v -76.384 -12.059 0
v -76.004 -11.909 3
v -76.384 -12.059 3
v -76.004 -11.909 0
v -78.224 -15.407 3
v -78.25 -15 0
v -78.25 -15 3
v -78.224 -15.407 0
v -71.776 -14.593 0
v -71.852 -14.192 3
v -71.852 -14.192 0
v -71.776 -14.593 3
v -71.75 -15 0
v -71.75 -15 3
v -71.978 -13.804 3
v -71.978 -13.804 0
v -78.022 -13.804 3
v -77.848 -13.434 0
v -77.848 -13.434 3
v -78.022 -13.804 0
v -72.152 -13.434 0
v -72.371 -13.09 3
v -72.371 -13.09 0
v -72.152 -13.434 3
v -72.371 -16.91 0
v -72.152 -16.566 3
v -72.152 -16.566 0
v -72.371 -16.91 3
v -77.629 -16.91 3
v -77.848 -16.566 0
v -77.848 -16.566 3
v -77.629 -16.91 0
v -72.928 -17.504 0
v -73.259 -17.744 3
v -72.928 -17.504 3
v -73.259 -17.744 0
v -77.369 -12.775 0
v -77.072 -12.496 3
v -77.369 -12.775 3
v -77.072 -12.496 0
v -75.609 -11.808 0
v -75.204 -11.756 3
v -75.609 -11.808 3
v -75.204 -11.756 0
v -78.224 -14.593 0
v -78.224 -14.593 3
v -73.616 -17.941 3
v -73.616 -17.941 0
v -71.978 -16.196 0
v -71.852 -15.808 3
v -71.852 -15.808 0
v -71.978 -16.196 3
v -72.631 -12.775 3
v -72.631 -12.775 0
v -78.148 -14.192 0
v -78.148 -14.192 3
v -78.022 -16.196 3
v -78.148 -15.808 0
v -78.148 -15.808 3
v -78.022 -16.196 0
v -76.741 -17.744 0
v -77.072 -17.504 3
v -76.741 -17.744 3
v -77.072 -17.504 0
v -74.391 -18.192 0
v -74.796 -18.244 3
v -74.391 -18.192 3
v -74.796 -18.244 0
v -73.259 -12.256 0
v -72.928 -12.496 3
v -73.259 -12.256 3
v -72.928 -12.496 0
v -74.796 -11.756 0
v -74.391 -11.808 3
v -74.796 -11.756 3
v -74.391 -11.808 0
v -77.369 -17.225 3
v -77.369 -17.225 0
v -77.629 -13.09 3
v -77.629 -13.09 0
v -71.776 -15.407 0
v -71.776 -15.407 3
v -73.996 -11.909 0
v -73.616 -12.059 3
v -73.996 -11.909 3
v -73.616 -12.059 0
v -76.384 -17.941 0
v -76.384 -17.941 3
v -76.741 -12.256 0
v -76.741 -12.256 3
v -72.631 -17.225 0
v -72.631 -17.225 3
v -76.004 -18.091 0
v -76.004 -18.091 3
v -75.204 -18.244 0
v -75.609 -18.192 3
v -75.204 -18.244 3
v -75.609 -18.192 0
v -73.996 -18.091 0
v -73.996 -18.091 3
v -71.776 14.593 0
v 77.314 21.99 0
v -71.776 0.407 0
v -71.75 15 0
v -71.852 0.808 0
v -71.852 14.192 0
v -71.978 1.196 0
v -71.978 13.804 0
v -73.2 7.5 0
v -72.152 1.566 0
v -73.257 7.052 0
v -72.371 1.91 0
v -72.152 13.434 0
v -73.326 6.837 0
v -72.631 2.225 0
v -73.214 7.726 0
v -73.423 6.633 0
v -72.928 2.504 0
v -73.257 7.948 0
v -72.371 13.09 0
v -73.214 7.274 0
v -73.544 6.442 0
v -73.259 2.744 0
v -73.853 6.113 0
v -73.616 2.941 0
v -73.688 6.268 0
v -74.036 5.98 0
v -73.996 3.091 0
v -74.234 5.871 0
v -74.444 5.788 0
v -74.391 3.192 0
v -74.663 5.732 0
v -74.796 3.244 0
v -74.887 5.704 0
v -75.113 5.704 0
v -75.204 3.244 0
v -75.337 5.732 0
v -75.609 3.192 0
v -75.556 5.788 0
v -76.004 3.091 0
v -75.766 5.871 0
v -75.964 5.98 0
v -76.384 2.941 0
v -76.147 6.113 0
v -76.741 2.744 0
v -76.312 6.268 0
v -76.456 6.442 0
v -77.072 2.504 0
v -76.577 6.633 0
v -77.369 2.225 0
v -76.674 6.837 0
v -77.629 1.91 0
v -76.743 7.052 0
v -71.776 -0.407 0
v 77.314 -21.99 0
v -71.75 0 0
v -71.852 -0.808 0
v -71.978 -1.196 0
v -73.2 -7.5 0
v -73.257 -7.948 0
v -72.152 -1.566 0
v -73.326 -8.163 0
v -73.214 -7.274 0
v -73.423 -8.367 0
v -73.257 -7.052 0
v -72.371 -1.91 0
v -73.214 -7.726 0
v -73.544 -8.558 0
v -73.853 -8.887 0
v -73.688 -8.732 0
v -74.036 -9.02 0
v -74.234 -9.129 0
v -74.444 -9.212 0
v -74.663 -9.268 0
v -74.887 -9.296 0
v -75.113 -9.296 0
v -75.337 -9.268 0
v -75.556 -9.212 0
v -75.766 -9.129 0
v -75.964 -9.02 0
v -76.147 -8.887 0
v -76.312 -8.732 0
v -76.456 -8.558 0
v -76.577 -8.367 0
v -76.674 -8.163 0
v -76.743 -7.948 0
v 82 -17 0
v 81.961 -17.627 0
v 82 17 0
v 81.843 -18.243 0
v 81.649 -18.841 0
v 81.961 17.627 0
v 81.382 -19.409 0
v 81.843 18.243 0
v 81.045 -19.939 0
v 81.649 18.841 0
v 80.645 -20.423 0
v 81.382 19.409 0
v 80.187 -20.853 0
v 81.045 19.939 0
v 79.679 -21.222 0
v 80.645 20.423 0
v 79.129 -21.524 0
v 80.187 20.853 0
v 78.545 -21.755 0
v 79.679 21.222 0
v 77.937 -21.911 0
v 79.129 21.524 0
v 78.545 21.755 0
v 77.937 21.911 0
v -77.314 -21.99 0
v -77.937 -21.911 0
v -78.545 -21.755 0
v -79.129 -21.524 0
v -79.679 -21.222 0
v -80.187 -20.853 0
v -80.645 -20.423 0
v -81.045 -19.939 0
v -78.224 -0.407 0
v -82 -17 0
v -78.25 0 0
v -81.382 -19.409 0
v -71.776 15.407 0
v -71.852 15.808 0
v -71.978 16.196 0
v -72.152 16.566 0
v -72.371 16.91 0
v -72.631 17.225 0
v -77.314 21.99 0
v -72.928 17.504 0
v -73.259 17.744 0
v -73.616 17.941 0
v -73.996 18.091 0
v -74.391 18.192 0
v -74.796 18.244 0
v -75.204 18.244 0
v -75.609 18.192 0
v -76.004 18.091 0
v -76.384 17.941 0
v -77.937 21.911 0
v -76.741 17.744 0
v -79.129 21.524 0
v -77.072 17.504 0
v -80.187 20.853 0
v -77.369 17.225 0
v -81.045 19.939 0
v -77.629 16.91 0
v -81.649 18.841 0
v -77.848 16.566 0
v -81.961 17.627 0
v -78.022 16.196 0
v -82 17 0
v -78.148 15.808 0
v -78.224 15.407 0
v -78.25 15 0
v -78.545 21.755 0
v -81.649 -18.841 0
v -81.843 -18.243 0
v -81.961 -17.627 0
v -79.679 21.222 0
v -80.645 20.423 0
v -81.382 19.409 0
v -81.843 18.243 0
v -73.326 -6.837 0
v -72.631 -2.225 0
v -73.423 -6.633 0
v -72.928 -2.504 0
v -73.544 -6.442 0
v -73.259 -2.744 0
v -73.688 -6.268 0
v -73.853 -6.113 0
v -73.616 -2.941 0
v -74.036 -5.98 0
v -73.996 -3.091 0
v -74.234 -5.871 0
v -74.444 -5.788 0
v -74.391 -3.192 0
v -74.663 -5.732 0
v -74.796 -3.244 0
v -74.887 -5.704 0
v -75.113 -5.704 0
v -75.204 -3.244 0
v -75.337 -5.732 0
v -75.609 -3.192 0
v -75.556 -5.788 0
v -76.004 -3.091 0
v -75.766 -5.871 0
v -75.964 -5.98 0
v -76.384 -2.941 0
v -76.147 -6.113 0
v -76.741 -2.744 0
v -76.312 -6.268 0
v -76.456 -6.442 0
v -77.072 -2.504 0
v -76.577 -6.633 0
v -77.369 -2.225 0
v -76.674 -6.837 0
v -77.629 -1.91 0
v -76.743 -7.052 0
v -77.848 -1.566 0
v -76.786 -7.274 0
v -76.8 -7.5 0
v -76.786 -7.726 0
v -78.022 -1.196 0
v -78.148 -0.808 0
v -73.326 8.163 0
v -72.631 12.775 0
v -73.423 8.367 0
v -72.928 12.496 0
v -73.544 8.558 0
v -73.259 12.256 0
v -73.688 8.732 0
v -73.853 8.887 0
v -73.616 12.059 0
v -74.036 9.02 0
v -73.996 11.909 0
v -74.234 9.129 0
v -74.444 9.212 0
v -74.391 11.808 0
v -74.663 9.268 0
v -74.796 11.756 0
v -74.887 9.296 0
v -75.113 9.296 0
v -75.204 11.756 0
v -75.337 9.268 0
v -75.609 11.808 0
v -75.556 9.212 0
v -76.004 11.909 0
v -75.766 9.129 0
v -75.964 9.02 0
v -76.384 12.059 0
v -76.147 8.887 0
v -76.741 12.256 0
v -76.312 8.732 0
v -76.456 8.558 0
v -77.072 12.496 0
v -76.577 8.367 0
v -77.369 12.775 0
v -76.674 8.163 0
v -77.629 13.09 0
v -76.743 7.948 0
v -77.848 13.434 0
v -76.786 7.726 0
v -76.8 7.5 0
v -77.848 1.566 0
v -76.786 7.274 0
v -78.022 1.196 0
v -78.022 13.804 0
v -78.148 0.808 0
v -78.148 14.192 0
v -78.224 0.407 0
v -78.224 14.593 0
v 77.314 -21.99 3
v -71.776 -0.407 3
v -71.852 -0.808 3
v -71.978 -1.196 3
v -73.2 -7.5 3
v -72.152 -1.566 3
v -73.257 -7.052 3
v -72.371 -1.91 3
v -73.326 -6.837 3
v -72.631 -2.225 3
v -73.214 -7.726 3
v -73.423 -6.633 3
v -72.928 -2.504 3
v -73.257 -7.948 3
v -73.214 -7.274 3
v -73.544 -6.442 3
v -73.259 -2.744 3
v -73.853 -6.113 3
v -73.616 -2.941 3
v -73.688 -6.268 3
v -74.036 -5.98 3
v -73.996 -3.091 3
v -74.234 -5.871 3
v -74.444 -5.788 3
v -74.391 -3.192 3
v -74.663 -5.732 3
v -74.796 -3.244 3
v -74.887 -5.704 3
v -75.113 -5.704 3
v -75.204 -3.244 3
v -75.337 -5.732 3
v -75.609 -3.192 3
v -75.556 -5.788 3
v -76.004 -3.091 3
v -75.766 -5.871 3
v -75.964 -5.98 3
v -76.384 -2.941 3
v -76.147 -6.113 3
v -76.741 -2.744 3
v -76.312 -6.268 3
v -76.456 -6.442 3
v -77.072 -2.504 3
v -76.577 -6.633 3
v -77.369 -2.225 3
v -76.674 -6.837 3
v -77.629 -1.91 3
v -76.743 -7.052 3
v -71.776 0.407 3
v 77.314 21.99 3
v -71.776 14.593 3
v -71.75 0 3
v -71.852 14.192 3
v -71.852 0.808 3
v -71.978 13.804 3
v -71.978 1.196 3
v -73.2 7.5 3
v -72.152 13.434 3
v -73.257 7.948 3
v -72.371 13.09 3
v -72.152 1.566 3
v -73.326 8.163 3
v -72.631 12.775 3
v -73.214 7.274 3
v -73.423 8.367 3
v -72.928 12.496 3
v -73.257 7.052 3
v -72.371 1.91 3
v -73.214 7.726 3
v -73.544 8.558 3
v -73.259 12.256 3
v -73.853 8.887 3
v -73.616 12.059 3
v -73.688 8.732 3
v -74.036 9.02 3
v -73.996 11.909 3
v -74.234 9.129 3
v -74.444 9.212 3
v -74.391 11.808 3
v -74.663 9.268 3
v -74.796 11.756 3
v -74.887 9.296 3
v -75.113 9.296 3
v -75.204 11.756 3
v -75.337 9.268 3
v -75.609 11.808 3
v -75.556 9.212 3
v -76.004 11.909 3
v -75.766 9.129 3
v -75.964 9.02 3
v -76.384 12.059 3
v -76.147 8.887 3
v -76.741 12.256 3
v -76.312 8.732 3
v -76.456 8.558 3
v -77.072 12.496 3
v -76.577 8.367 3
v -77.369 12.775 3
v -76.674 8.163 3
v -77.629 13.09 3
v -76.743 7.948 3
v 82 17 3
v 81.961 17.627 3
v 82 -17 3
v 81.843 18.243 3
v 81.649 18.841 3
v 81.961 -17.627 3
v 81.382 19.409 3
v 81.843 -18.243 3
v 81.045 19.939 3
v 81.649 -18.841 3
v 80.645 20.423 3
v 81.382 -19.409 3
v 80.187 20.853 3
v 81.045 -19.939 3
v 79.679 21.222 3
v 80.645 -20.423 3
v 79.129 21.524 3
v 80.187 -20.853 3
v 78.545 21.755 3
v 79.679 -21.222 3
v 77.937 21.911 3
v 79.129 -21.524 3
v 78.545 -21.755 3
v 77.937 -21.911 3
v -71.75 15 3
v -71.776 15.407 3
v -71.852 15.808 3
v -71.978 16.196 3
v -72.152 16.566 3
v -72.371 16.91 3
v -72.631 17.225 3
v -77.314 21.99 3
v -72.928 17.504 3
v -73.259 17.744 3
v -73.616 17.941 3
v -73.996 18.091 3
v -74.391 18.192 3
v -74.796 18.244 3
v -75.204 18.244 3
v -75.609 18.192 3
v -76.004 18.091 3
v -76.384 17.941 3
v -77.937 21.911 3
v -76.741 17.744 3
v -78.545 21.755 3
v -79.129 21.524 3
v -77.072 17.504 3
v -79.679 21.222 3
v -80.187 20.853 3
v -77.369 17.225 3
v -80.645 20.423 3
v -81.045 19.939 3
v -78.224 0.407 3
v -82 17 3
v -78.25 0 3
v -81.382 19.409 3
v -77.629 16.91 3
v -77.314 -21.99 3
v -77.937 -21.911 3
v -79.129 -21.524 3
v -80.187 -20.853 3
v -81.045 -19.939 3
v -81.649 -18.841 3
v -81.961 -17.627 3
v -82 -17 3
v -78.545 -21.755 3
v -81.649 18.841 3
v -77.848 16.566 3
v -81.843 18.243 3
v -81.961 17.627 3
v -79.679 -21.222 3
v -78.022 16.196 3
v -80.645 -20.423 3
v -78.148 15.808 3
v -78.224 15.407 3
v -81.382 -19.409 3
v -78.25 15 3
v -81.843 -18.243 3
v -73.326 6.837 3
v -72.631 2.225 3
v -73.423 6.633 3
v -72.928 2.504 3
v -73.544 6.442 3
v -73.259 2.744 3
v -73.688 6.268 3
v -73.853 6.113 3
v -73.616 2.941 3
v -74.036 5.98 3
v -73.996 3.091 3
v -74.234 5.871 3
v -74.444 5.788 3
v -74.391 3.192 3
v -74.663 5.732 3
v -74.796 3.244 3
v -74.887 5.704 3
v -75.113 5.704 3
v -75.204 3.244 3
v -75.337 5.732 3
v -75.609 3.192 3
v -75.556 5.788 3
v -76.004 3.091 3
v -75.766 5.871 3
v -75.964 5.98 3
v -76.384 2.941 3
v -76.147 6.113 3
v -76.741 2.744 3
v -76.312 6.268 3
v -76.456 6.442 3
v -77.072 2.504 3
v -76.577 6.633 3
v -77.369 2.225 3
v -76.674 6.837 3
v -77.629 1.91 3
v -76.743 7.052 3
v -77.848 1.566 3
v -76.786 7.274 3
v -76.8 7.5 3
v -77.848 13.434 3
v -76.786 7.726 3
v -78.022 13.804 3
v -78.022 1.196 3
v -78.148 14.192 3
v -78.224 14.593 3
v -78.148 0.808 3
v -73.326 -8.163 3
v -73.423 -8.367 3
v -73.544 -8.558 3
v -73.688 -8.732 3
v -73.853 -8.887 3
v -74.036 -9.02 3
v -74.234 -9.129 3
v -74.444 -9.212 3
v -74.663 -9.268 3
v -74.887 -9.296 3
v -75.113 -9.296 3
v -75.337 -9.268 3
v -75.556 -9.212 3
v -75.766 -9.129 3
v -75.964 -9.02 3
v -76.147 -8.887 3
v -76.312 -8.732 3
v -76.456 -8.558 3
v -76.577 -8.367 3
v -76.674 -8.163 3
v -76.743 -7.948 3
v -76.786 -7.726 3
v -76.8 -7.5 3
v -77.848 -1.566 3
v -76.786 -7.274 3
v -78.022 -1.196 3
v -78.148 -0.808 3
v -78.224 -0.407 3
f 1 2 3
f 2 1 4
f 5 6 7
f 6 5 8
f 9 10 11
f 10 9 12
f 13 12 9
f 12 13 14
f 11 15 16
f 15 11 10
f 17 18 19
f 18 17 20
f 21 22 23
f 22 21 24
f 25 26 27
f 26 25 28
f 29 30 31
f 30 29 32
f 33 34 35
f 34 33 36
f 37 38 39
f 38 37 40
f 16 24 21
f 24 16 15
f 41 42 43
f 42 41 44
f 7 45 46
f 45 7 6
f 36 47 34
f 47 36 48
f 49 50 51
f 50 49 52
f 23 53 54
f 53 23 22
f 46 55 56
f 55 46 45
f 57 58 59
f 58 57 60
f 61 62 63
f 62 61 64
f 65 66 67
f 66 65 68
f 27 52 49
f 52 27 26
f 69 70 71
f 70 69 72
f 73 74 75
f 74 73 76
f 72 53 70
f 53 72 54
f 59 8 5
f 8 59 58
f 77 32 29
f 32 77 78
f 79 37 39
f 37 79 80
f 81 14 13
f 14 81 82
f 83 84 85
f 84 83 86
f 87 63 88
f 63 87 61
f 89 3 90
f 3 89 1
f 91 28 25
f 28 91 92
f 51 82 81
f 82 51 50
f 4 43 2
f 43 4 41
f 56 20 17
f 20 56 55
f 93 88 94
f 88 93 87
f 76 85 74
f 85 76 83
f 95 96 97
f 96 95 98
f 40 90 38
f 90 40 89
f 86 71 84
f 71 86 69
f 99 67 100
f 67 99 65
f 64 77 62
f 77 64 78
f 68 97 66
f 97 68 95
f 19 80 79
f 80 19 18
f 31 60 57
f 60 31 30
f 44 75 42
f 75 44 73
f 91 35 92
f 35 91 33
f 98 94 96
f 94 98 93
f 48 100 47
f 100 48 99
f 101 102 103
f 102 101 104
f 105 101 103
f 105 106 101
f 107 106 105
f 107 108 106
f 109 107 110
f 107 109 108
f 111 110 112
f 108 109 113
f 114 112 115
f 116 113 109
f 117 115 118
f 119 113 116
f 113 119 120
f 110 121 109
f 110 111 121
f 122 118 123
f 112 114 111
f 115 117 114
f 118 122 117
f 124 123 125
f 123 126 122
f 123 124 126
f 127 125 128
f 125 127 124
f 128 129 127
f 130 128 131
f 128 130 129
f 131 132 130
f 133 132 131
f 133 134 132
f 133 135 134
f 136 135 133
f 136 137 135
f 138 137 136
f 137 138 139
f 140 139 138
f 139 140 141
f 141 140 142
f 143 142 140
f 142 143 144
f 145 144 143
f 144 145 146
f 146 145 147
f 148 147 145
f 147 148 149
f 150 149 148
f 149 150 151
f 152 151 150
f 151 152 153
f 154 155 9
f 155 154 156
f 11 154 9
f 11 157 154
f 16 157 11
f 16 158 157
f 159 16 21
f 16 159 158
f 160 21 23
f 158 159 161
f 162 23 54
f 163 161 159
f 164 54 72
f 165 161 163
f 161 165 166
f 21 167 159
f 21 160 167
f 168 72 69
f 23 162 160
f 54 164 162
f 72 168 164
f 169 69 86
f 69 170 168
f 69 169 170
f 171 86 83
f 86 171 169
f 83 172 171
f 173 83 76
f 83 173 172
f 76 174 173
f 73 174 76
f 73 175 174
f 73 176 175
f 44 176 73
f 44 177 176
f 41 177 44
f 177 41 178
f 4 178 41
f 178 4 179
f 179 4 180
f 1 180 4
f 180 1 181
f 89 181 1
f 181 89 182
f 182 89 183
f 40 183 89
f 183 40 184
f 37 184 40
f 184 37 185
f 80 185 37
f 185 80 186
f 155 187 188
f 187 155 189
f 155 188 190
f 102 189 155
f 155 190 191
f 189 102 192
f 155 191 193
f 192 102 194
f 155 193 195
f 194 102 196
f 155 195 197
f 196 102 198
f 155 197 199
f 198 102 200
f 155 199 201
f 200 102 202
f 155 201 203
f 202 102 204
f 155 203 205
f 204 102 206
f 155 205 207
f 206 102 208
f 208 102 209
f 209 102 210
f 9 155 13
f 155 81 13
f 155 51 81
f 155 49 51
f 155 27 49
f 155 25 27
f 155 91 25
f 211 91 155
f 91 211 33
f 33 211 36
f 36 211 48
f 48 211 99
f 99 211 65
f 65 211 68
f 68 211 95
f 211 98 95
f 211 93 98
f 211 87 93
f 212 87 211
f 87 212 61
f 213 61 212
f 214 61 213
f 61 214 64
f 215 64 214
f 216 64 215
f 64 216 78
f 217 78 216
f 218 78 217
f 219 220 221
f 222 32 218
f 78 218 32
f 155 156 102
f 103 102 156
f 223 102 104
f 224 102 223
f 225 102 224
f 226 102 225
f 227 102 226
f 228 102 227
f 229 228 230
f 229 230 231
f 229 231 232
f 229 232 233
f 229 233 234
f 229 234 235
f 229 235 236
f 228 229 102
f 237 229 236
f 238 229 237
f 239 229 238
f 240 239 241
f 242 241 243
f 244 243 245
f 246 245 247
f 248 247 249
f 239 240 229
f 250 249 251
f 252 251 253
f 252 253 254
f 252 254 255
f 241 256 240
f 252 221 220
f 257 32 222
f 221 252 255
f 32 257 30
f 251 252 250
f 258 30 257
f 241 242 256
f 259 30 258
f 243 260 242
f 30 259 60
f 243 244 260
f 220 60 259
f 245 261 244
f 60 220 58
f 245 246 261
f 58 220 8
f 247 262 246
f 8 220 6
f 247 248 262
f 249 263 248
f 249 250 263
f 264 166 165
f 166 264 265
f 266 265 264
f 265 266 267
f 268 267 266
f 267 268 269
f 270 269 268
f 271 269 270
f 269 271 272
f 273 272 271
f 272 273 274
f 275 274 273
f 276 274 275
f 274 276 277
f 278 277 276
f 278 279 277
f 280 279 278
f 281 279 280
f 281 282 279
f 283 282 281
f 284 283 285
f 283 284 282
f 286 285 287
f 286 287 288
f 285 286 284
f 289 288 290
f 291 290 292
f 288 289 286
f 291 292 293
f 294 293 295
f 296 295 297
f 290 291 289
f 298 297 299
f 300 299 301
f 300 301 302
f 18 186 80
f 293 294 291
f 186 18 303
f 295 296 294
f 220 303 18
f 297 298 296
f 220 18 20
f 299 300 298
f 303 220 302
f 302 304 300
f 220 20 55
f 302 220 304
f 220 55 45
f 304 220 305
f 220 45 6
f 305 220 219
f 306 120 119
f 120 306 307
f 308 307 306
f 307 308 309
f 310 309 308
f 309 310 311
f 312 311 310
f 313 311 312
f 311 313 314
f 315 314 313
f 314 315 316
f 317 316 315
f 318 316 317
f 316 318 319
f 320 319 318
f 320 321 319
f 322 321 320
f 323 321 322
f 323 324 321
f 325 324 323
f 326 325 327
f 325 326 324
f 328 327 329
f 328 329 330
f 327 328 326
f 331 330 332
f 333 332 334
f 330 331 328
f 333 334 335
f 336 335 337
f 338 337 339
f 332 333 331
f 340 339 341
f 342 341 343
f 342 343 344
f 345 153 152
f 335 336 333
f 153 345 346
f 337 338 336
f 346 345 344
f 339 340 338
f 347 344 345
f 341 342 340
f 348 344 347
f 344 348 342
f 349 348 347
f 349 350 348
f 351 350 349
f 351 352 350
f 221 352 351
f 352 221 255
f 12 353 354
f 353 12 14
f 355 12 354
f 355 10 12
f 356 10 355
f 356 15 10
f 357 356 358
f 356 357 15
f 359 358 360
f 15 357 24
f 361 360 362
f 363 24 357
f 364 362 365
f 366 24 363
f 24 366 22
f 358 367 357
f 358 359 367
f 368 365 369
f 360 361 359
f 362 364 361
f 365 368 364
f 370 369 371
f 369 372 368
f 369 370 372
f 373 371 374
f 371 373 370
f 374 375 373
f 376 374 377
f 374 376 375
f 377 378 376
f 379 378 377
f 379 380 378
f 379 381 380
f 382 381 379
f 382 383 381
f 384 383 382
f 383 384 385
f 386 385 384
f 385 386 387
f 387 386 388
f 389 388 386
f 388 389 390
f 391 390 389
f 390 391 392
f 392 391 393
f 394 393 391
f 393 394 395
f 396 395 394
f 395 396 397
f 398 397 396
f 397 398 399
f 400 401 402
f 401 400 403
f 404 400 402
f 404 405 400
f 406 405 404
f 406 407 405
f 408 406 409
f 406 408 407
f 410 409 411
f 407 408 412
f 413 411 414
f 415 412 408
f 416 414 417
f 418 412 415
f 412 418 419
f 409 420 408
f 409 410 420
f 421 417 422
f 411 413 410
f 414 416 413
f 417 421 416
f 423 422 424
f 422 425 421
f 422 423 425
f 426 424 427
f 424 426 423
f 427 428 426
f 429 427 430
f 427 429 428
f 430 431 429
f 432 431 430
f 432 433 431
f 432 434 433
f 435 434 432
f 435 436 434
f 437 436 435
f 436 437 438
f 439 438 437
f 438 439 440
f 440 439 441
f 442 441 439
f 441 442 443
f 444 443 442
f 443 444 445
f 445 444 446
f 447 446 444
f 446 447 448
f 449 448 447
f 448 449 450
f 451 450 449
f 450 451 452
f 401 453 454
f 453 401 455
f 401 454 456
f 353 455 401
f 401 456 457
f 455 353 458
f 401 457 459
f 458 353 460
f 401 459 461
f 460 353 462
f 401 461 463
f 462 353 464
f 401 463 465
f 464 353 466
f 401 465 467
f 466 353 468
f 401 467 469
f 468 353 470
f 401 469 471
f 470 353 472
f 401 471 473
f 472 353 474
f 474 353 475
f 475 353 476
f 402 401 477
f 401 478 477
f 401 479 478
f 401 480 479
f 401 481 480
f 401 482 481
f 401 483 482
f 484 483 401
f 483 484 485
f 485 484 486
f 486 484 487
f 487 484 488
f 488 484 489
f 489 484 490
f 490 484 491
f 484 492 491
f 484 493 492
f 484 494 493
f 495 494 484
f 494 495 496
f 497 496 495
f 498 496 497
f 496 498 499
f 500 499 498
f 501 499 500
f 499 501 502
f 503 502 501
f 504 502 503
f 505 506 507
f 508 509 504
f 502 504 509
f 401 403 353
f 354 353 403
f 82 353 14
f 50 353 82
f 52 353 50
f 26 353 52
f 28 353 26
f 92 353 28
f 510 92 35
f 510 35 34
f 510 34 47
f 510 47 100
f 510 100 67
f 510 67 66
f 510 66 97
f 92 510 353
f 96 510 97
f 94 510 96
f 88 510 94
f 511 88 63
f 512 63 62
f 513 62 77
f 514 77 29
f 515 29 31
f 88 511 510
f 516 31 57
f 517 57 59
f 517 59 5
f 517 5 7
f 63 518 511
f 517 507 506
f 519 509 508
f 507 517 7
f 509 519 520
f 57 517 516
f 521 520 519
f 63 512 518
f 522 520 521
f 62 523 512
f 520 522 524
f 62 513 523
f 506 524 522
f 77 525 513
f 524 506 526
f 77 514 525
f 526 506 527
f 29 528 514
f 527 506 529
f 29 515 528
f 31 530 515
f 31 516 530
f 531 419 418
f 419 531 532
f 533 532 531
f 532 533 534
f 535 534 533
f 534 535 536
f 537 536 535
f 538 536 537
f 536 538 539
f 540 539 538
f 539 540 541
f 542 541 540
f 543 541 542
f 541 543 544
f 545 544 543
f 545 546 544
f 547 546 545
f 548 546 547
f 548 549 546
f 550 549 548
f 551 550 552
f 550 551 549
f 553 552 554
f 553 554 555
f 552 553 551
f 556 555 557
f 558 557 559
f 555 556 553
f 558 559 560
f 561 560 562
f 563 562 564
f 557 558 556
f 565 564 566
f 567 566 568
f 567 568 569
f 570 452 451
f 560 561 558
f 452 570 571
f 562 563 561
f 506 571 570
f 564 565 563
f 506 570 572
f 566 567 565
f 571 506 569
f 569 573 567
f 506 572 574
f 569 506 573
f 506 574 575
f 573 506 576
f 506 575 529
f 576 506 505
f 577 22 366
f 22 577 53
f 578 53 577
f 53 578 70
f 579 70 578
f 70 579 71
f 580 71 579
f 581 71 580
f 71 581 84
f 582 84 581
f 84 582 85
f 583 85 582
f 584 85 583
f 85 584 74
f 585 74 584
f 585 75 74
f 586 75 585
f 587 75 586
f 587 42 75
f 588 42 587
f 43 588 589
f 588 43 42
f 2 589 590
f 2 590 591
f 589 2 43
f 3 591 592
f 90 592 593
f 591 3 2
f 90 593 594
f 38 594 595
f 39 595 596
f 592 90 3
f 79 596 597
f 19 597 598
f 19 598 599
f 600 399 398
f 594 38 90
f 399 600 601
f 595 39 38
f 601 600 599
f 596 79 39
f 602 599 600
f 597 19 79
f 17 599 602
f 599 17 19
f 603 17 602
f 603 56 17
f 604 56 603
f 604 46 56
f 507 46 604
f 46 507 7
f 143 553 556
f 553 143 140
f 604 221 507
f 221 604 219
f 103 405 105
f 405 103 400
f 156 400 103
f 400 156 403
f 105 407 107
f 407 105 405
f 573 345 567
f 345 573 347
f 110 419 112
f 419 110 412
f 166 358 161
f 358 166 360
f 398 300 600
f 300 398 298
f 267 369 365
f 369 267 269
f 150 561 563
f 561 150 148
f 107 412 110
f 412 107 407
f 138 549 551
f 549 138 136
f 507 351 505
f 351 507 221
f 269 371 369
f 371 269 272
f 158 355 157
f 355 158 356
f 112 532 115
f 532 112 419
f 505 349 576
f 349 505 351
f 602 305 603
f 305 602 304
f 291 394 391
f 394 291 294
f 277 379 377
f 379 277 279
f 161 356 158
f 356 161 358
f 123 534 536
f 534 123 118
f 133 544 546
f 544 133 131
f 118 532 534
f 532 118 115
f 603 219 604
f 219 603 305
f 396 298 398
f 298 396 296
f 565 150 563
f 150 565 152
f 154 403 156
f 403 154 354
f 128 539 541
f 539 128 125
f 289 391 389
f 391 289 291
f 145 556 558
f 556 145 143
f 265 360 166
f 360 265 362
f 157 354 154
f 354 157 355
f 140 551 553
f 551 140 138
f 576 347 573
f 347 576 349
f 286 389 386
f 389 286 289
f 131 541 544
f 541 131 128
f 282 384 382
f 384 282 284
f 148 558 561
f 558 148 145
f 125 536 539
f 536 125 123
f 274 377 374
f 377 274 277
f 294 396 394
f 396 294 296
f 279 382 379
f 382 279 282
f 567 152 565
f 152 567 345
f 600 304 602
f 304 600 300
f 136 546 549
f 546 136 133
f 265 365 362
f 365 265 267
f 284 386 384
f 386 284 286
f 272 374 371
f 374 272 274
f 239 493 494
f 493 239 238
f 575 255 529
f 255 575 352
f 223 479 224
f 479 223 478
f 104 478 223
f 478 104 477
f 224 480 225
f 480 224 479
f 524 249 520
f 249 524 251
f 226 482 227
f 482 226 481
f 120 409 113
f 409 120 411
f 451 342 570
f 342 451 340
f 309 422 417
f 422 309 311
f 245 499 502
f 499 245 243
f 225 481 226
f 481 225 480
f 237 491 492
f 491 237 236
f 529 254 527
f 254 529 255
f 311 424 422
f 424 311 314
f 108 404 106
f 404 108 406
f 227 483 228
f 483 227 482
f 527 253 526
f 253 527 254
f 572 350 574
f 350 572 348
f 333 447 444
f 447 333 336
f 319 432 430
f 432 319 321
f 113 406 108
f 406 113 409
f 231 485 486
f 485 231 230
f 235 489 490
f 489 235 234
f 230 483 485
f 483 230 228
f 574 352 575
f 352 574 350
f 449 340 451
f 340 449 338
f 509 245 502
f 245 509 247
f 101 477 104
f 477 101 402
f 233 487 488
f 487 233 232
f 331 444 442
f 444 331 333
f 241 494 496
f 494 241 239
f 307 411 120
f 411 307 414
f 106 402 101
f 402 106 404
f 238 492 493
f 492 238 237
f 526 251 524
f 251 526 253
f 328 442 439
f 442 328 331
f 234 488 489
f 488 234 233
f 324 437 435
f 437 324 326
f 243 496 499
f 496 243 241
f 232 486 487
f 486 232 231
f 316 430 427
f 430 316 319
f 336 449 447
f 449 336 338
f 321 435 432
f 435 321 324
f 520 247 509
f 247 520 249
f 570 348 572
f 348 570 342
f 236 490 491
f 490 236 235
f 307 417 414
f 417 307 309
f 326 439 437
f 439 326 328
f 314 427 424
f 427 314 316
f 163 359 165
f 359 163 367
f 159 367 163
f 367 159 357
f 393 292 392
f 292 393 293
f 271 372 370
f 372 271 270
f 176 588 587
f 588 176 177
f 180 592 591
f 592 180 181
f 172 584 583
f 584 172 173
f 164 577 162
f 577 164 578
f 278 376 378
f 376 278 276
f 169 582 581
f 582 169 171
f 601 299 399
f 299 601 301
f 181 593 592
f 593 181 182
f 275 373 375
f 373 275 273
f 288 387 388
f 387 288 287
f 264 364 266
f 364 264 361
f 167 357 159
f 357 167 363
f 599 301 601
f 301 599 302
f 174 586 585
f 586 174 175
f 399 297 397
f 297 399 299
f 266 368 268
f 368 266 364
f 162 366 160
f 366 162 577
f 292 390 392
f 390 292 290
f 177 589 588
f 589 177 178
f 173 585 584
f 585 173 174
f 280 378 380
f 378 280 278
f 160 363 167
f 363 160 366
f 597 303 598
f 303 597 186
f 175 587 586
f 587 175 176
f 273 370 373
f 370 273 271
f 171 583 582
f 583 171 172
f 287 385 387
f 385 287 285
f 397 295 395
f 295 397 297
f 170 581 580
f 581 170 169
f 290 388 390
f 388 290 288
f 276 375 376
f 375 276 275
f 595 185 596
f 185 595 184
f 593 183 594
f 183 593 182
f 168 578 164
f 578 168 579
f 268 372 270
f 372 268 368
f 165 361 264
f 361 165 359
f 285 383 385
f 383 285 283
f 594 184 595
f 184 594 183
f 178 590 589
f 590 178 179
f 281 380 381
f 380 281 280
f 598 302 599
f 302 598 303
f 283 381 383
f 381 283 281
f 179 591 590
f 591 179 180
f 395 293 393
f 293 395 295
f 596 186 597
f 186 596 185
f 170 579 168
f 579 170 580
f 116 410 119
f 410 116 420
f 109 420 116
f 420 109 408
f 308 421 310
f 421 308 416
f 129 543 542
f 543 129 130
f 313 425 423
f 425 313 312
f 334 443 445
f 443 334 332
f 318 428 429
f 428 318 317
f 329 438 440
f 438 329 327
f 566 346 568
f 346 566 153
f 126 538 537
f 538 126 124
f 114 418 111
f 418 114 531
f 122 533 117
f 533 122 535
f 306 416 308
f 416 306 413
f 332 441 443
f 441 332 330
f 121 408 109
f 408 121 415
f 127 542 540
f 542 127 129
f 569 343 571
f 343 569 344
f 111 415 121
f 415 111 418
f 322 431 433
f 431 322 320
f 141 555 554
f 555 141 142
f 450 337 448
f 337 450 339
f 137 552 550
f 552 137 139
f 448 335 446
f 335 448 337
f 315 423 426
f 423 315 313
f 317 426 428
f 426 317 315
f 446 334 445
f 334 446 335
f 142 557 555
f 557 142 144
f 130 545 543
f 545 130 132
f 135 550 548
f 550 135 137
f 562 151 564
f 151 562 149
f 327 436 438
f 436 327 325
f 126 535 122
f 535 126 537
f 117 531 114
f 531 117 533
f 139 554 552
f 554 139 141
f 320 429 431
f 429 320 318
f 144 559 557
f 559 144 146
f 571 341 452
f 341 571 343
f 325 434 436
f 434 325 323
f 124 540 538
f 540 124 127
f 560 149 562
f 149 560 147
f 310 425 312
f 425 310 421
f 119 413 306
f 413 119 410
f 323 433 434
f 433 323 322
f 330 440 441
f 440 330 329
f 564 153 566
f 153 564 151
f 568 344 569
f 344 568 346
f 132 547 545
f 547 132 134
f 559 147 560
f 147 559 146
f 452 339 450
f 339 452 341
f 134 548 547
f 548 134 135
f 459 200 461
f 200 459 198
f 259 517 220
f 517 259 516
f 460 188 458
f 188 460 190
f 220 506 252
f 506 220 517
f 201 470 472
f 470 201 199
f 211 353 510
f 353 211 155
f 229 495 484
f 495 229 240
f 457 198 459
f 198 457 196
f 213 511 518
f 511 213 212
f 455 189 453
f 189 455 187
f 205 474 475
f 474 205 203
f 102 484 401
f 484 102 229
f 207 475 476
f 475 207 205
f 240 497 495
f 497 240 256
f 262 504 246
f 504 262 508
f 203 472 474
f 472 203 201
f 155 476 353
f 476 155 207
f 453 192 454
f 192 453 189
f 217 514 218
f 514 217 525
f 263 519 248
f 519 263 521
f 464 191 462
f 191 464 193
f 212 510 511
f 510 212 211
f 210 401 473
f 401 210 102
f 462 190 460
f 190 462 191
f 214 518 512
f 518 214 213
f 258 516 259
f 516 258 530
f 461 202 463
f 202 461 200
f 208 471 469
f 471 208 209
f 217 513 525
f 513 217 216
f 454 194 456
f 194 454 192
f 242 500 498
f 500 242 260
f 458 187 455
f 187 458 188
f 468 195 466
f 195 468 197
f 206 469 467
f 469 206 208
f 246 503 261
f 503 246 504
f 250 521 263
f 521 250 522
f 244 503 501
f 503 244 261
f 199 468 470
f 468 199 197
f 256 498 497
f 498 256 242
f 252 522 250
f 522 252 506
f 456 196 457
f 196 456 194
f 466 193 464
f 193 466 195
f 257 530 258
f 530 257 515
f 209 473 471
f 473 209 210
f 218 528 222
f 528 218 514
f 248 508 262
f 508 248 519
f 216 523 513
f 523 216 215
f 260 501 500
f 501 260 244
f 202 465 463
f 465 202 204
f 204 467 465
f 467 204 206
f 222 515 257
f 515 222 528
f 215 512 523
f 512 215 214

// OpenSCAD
$fn = 50;


difference() {
	union() {
		hull() {
			translate(v = [-77.0000000000, 17.0000000000, 0]) {
				cylinder(h = 3, r = 5);
			}
			translate(v = [77.0000000000, 17.0000000000, 0]) {
				cylinder(h = 3, r = 5);
			}
			translate(v = [-77.0000000000, -17.0000000000, 0]) {
				cylinder(h = 3, r = 5);
			}
			translate(v = [77.0000000000, -17.0000000000, 0]) {
				cylinder(h = 3, r = 5);
			}
		}
	}
	union() {
		translate(v = [-75.0000000000, -15.0000000000, 0]) {
			cylinder(h = 3, r = 3.2500000000);
		}
		translate(v = [-75.0000000000, 0.0000000000, 0]) {
			cylinder(h = 3, r = 3.2500000000);
		}
		translate(v = [-75.0000000000, 15.0000000000, 0]) {
			cylinder(h = 3, r = 3.2500000000);
		}
		translate(v = [-75.0000000000, -15.0000000000, 0]) {
			cylinder(h = 3, r = 1.8000000000);
		}
		translate(v = [-75.0000000000, -7.5000000000, 0]) {
			cylinder(h = 3, r = 1.8000000000);
		}
		translate(v = [-75.0000000000, 0.0000000000, 0]) {
			cylinder(h = 3, r = 1.8000000000);
		}
		translate(v = [-75.0000000000, 7.5000000000, 0]) {
			cylinder(h = 3, r = 1.8000000000);
		}
		translate(v = [-75.0000000000, 15.0000000000, 0]) {
			cylinder(h = 3, r = 1.8000000000);
		}
		translate(v = [-75.0000000000, -15.0000000000, 0]) {
			cylinder(h = 3, r = 1.8000000000);
		}
		translate(v = [-75.0000000000, -7.5000000000, 0]) {
			cylinder(h = 3, r = 1.8000000000);
		}
		translate(v = [-75.0000000000, 0.0000000000, 0]) {
			cylinder(h = 3, r = 1.8000000000);
		}
		translate(v = [-75.0000000000, 7.5000000000, 0]) {
			cylinder(h = 3, r = 1.8000000000);
		}
		translate(v = [-75.0000000000, 15.0000000000, 0]) {
			cylinder(h = 3, r = 1.8000000000);
		}
		translate(v = [-75.0000000000, -15.0000000000, 0]) {
			cylinder(h = 3, r = 1.8000000000);
		}
		translate(v = [-75.0000000000, -7.5000000000, 0]) {
			cylinder(h = 3, r = 1.8000000000);
		}
		translate(v = [-75.0000000000, 0.0000000000, 0]) {
			cylinder(h = 3, r = 1.8000000000);
		}
		translate(v = [-75.0000000000, 7.5000000000, 0]) {
			cylinder(h = 3, r = 1.8000000000);
		}
		translate(v = [-75.0000000000, 15.0000000000, 0]) {
			cylinder(h = 3, r = 1.8000000000);
		}
	}
}
